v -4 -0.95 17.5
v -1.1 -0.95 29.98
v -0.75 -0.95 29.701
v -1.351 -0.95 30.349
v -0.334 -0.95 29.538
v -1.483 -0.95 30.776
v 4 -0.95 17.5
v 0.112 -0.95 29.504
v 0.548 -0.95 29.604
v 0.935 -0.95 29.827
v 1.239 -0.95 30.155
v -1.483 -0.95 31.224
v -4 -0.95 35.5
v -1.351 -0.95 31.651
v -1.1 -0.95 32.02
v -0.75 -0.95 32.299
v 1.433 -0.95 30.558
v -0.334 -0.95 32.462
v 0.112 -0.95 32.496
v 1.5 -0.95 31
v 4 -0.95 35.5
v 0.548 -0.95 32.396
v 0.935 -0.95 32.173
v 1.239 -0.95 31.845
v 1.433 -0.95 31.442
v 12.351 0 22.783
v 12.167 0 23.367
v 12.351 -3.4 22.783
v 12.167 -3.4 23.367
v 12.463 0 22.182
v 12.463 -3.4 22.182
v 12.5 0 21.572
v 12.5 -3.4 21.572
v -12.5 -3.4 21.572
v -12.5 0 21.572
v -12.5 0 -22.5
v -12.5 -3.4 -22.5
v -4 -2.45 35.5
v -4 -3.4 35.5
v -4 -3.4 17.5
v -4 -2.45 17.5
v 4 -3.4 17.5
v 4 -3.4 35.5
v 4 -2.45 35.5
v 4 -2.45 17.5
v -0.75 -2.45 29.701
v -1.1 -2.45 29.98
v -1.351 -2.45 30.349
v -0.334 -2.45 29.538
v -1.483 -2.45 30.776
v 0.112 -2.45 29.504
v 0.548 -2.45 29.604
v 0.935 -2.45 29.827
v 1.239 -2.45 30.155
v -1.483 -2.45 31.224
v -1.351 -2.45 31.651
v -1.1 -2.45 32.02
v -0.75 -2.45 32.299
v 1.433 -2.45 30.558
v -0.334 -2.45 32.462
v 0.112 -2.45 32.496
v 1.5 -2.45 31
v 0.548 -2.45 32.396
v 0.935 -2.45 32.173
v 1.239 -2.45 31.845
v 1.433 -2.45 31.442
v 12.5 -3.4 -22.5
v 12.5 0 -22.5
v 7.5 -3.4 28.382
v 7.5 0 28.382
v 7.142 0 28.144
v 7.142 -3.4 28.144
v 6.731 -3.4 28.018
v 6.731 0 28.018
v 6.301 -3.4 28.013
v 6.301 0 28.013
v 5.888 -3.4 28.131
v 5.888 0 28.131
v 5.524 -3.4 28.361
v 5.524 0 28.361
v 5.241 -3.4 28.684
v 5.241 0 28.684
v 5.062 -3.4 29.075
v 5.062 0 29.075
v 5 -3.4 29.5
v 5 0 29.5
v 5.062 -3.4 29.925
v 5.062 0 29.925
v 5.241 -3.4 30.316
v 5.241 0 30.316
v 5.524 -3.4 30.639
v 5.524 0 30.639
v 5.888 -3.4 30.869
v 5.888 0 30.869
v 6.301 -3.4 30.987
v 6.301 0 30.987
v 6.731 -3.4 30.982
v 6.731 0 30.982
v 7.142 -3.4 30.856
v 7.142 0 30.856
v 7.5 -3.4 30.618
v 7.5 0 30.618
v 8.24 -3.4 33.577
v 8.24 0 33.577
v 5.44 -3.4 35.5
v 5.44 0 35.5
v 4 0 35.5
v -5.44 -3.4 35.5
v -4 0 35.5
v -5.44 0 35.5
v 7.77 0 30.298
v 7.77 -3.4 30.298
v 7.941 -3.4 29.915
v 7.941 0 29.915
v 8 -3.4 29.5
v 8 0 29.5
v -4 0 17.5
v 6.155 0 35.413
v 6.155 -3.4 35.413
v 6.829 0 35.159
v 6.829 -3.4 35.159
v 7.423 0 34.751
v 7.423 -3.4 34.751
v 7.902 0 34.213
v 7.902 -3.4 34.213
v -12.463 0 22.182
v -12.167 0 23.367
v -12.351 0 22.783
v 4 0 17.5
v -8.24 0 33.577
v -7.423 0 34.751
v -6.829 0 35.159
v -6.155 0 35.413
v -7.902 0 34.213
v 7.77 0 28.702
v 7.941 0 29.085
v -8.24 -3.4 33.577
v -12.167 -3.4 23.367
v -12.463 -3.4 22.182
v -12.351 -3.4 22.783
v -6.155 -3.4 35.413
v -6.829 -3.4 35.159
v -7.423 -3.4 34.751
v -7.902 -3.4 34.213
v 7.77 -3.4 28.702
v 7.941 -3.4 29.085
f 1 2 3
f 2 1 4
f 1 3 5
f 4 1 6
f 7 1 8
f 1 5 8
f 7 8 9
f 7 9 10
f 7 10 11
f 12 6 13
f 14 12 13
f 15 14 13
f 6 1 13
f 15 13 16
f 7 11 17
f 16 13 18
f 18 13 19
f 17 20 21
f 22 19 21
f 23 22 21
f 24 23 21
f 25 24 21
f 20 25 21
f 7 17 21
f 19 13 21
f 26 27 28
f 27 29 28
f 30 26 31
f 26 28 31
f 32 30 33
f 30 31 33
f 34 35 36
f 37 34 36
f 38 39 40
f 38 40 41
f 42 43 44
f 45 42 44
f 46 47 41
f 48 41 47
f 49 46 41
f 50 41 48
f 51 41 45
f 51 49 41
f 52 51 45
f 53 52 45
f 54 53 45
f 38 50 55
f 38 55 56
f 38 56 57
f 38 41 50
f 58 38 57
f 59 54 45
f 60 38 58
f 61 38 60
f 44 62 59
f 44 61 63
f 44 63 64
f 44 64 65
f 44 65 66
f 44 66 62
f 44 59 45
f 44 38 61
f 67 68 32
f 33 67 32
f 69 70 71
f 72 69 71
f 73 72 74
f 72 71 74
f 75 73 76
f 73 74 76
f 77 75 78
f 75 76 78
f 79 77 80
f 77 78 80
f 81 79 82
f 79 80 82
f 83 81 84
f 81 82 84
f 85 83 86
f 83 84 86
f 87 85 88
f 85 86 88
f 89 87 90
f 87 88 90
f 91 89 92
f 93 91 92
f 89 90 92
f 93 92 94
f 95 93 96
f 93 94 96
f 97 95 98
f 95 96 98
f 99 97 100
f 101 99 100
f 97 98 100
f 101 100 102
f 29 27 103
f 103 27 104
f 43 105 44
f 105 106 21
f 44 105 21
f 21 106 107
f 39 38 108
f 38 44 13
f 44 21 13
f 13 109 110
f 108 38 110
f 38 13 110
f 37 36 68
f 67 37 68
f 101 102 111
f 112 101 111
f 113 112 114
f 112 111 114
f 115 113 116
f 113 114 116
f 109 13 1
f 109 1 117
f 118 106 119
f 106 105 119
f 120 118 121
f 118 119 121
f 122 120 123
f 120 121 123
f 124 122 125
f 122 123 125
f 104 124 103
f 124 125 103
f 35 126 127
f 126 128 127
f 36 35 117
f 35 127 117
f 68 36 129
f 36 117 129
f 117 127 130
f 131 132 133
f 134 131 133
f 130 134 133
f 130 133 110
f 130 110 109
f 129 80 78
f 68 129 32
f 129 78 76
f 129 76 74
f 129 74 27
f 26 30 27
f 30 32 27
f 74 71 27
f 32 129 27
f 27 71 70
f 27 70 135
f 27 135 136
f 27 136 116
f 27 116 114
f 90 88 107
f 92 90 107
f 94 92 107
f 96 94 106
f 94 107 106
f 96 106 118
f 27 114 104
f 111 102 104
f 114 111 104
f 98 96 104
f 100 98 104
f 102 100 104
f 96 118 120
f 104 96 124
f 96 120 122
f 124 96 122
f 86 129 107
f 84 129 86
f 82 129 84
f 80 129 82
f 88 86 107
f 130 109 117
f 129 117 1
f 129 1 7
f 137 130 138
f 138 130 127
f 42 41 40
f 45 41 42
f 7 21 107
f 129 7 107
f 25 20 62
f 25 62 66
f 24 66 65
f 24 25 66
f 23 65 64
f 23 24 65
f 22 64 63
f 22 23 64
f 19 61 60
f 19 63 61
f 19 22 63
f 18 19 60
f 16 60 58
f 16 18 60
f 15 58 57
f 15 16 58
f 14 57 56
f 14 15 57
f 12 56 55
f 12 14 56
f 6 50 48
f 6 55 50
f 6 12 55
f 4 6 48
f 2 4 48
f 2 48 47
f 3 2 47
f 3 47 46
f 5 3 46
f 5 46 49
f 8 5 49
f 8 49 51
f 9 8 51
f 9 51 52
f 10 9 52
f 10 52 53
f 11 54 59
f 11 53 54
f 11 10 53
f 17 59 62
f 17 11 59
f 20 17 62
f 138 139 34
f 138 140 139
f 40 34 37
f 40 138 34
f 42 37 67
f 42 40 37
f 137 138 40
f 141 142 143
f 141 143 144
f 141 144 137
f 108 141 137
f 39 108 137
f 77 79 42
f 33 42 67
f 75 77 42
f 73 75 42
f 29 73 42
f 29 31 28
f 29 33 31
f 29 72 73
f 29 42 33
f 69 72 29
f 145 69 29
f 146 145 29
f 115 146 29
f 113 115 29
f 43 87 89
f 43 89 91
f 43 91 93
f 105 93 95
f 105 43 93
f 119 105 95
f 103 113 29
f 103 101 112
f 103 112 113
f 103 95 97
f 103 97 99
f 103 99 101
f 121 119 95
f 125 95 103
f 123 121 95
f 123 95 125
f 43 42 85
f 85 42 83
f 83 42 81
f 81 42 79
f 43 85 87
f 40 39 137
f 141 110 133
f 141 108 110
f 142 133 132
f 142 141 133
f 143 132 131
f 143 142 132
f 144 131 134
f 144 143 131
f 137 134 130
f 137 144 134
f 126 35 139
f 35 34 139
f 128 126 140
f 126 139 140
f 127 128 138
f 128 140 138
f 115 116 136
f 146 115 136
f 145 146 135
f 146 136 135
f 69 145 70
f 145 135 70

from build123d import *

# Parameters (mm, degrees)
F1_R     = 1.5
F1_W     = 15
F1_H     = 13
F2_DEPTH = 3.4
F3_W     = 8
F3_H     = 0.95
F4_DEPTH = 18
F5_DEPTH = 18
F6_R     = 3
F7_R     = 3
F8_R     = 5
F9_R     = 5


with BuildPart() as f2:
    # F1 (on Front) → F2 (new body)
    with BuildSketch(Plane.XZ):
        Polygon((12.5, -22.5), (12.5, 22.5), (7.5, 22.5), (7.5, 9.5), (-7.5, 9.5), (-7.5, 22.5), (-12.5, 22.5), (-12.5, -22.5), align=None)
        with BuildLine():
            Line((7.5, 22.5), (12.5, 22.5))
            Line((12.5, 22.5), (7.5, 35.5))
            Line((7.5, 35.5), (7.5, 30.6180339887))
            ThreePointArc((7.5, 30.6180339887), (7.8693063938, 30.1123724357), (8, 29.5))
            ThreePointArc((8, 29.5), (7.8693063938, 28.8876275643), (7.5, 28.3819660113))
            Line((7.5, 28.3819660113), (7.5, 22.5))
        make_face()
        with BuildLine():
            Line((-7.5, 22.5), (7.5, 22.5))
            Line((7.5, 22.5), (7.5, 28.3819660113))
            ThreePointArc((7.5, 28.3819660113), (5, 29.5), (7.5, 30.6180339887))
            Line((7.5, 30.6180339887), (7.5, 35.5))
            Line((7.5, 35.5), (-7.5, 35.5))
            Line((-7.5, 35.5), (-7.5, 22.5))
        make_face()
        with Locations((0, 31)):
            Circle(F1_R, mode=Mode.SUBTRACT)
        Polygon((-12.5, 22.5), (-7.5, 22.5), (-7.5, 35.5), align=None)
        with Locations((0, 16)):
            Rectangle(F1_W, F1_H)
    extrude(amount=F2_DEPTH)

    # F3 (on face) → F4 (cut)
    with BuildSketch(Plane.XY.offset(35.5)):
        with Locations((0, -0.475)):
            Rectangle(F3_W, F3_H)
    extrude(amount=-F4_DEPTH, mode=Mode.SUBTRACT)

    # F3 (on face) → F5 (cut)
    with BuildSketch(Plane.XY.offset(35.5)):
        with Locations((0, -2.925)):
            Rectangle(F3_W, F3_H)
    extrude(amount=-F5_DEPTH, mode=Mode.SUBTRACT)

    # F6
    f6_edges = [f2.edges().sort_by_distance(p)[0] for p in [
        (-7.5, -1.7, 35.5),
    ]]
    fillet(f6_edges, radius=F6_R)

    # F7
    f7_edges = [f2.edges().sort_by_distance(p)[0] for p in [
        (7.5, -1.7, 35.5),
    ]]
    fillet(f7_edges, radius=F7_R)

    # F8
    f8_edges = [f2.edges().sort_by_distance(p)[0] for p in [
        (12.5, -1.7, 22.5),
    ]]
    fillet(f8_edges, radius=F8_R)

    # F9
    f9_edges = [f2.edges().sort_by_distance(p)[0] for p in [
        (-12.5, -1.7, 22.5),
    ]]
    fillet(f9_edges, radius=F9_R)


solid = f2.part
